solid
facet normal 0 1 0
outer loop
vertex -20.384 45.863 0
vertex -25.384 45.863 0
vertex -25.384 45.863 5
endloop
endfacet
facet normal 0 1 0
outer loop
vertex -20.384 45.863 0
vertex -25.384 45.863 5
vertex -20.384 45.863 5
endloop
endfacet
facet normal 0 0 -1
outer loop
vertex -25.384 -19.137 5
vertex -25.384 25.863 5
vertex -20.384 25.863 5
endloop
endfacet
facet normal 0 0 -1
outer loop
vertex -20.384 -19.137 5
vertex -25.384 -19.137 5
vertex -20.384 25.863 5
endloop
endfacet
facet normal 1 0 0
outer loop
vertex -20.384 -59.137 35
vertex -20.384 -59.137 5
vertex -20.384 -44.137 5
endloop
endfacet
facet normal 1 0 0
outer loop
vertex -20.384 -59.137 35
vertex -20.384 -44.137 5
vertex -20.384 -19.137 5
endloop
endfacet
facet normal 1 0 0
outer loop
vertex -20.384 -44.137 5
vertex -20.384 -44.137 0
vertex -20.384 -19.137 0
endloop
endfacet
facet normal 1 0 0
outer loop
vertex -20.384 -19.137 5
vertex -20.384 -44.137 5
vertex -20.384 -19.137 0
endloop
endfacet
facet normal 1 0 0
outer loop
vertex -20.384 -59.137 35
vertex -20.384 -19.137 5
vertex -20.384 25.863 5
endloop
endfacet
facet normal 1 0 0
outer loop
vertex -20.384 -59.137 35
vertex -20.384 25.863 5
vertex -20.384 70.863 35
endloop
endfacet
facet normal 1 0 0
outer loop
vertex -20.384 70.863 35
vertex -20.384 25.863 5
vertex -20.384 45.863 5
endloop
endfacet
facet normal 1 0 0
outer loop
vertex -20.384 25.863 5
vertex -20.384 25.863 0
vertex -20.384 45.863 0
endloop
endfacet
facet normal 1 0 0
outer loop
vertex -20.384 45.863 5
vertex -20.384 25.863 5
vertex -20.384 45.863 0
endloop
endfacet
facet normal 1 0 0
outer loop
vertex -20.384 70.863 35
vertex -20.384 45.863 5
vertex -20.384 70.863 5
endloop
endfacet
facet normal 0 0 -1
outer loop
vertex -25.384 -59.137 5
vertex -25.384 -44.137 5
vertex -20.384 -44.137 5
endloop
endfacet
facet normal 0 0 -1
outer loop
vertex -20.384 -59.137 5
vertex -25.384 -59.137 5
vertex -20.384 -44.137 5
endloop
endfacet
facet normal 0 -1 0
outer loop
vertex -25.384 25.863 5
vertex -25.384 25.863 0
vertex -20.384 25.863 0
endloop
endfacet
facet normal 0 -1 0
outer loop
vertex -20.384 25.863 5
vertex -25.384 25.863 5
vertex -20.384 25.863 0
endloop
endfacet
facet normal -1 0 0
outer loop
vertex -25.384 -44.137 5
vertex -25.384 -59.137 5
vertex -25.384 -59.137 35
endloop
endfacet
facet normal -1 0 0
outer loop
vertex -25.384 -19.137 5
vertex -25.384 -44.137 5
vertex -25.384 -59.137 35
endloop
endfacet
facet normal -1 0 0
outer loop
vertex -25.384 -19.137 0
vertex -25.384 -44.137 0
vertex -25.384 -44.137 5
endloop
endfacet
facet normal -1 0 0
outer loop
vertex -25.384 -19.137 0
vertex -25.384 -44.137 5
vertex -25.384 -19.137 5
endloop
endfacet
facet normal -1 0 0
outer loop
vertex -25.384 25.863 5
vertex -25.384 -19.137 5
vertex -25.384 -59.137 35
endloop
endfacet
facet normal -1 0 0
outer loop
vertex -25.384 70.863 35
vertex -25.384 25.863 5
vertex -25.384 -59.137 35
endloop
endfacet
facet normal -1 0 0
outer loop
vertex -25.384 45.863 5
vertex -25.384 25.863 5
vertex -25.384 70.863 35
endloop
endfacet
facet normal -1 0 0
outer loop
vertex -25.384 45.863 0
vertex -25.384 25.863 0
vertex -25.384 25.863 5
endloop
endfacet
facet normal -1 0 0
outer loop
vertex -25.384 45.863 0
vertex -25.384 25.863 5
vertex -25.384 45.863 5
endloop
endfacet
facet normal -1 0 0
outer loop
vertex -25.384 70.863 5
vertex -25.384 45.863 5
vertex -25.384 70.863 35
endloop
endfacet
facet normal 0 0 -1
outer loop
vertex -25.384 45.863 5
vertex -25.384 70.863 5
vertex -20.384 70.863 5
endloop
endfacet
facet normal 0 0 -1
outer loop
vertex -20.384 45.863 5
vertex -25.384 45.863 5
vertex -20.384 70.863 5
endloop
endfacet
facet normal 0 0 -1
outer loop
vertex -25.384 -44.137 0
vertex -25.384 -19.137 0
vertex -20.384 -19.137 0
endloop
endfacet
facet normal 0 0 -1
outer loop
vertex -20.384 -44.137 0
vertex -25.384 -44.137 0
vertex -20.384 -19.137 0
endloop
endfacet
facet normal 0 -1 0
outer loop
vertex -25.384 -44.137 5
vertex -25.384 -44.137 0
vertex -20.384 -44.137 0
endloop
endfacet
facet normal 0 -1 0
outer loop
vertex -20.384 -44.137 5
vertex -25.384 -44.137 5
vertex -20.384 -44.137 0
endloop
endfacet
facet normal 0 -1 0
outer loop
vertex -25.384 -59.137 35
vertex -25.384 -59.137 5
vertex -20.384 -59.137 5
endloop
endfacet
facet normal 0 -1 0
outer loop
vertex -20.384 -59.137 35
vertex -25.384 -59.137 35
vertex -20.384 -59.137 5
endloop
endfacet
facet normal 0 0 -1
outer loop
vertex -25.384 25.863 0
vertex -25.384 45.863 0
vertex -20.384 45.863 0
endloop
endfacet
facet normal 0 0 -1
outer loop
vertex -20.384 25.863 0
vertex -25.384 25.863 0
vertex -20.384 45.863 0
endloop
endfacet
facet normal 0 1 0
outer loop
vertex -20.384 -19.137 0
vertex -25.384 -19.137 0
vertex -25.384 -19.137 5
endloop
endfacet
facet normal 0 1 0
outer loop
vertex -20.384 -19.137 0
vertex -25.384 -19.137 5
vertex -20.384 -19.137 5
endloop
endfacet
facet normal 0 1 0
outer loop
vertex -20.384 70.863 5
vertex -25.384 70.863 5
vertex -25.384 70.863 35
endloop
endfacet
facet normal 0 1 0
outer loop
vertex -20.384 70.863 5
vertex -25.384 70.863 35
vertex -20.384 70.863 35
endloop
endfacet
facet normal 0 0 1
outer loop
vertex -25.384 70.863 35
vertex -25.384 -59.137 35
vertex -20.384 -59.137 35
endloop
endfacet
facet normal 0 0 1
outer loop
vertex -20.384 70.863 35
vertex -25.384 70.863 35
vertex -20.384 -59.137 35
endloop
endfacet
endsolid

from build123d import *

# Parameters (mm, degrees)
SKETCH1_W             = 5
SKETCH1_H             = 20
BOSS_EXTRUDE1_DEPTH   = 5
SKETCH1_H_2           = 25
BOSS_EXTRUDE1_2_DEPTH = 5
SKETCH2_W             = 5
SKETCH2_H             = 130
BOSS_EXTRUDE2_DEPTH   = 30


with BuildPart() as part:
    # Sketch1 → Boss-Extrude1 (new body)
    with BuildSketch(Plane.XY):
        with Locations((-22.883589858, 35.86307718)):
            Rectangle(SKETCH1_W, SKETCH1_H)
    extrude(amount=BOSS_EXTRUDE1_DEPTH)



with BuildPart() as body_2:
    # Sketch1 → Boss-Extrude1 2 (new body)
    with BuildSketch(Plane.XY):
        with Locations((-22.883589858, -31.63692282)):
            Rectangle(SKETCH1_W, SKETCH1_H_2)
    extrude(amount=BOSS_EXTRUDE1_2_DEPTH)


with BuildPart() as part_1:
    add(part.part)

    add(body_2.part)  # Boss-Extrude2 merges body 2
    # Sketch2 → Boss-Extrude2 (add)
    with BuildSketch(Plane.XY.offset(5)):
        with Locations((-22.883589858, 5.86307718)):
            Rectangle(SKETCH2_W, SKETCH2_H)
    extrude(amount=BOSS_EXTRUDE2_DEPTH)


solid = part_1.part
